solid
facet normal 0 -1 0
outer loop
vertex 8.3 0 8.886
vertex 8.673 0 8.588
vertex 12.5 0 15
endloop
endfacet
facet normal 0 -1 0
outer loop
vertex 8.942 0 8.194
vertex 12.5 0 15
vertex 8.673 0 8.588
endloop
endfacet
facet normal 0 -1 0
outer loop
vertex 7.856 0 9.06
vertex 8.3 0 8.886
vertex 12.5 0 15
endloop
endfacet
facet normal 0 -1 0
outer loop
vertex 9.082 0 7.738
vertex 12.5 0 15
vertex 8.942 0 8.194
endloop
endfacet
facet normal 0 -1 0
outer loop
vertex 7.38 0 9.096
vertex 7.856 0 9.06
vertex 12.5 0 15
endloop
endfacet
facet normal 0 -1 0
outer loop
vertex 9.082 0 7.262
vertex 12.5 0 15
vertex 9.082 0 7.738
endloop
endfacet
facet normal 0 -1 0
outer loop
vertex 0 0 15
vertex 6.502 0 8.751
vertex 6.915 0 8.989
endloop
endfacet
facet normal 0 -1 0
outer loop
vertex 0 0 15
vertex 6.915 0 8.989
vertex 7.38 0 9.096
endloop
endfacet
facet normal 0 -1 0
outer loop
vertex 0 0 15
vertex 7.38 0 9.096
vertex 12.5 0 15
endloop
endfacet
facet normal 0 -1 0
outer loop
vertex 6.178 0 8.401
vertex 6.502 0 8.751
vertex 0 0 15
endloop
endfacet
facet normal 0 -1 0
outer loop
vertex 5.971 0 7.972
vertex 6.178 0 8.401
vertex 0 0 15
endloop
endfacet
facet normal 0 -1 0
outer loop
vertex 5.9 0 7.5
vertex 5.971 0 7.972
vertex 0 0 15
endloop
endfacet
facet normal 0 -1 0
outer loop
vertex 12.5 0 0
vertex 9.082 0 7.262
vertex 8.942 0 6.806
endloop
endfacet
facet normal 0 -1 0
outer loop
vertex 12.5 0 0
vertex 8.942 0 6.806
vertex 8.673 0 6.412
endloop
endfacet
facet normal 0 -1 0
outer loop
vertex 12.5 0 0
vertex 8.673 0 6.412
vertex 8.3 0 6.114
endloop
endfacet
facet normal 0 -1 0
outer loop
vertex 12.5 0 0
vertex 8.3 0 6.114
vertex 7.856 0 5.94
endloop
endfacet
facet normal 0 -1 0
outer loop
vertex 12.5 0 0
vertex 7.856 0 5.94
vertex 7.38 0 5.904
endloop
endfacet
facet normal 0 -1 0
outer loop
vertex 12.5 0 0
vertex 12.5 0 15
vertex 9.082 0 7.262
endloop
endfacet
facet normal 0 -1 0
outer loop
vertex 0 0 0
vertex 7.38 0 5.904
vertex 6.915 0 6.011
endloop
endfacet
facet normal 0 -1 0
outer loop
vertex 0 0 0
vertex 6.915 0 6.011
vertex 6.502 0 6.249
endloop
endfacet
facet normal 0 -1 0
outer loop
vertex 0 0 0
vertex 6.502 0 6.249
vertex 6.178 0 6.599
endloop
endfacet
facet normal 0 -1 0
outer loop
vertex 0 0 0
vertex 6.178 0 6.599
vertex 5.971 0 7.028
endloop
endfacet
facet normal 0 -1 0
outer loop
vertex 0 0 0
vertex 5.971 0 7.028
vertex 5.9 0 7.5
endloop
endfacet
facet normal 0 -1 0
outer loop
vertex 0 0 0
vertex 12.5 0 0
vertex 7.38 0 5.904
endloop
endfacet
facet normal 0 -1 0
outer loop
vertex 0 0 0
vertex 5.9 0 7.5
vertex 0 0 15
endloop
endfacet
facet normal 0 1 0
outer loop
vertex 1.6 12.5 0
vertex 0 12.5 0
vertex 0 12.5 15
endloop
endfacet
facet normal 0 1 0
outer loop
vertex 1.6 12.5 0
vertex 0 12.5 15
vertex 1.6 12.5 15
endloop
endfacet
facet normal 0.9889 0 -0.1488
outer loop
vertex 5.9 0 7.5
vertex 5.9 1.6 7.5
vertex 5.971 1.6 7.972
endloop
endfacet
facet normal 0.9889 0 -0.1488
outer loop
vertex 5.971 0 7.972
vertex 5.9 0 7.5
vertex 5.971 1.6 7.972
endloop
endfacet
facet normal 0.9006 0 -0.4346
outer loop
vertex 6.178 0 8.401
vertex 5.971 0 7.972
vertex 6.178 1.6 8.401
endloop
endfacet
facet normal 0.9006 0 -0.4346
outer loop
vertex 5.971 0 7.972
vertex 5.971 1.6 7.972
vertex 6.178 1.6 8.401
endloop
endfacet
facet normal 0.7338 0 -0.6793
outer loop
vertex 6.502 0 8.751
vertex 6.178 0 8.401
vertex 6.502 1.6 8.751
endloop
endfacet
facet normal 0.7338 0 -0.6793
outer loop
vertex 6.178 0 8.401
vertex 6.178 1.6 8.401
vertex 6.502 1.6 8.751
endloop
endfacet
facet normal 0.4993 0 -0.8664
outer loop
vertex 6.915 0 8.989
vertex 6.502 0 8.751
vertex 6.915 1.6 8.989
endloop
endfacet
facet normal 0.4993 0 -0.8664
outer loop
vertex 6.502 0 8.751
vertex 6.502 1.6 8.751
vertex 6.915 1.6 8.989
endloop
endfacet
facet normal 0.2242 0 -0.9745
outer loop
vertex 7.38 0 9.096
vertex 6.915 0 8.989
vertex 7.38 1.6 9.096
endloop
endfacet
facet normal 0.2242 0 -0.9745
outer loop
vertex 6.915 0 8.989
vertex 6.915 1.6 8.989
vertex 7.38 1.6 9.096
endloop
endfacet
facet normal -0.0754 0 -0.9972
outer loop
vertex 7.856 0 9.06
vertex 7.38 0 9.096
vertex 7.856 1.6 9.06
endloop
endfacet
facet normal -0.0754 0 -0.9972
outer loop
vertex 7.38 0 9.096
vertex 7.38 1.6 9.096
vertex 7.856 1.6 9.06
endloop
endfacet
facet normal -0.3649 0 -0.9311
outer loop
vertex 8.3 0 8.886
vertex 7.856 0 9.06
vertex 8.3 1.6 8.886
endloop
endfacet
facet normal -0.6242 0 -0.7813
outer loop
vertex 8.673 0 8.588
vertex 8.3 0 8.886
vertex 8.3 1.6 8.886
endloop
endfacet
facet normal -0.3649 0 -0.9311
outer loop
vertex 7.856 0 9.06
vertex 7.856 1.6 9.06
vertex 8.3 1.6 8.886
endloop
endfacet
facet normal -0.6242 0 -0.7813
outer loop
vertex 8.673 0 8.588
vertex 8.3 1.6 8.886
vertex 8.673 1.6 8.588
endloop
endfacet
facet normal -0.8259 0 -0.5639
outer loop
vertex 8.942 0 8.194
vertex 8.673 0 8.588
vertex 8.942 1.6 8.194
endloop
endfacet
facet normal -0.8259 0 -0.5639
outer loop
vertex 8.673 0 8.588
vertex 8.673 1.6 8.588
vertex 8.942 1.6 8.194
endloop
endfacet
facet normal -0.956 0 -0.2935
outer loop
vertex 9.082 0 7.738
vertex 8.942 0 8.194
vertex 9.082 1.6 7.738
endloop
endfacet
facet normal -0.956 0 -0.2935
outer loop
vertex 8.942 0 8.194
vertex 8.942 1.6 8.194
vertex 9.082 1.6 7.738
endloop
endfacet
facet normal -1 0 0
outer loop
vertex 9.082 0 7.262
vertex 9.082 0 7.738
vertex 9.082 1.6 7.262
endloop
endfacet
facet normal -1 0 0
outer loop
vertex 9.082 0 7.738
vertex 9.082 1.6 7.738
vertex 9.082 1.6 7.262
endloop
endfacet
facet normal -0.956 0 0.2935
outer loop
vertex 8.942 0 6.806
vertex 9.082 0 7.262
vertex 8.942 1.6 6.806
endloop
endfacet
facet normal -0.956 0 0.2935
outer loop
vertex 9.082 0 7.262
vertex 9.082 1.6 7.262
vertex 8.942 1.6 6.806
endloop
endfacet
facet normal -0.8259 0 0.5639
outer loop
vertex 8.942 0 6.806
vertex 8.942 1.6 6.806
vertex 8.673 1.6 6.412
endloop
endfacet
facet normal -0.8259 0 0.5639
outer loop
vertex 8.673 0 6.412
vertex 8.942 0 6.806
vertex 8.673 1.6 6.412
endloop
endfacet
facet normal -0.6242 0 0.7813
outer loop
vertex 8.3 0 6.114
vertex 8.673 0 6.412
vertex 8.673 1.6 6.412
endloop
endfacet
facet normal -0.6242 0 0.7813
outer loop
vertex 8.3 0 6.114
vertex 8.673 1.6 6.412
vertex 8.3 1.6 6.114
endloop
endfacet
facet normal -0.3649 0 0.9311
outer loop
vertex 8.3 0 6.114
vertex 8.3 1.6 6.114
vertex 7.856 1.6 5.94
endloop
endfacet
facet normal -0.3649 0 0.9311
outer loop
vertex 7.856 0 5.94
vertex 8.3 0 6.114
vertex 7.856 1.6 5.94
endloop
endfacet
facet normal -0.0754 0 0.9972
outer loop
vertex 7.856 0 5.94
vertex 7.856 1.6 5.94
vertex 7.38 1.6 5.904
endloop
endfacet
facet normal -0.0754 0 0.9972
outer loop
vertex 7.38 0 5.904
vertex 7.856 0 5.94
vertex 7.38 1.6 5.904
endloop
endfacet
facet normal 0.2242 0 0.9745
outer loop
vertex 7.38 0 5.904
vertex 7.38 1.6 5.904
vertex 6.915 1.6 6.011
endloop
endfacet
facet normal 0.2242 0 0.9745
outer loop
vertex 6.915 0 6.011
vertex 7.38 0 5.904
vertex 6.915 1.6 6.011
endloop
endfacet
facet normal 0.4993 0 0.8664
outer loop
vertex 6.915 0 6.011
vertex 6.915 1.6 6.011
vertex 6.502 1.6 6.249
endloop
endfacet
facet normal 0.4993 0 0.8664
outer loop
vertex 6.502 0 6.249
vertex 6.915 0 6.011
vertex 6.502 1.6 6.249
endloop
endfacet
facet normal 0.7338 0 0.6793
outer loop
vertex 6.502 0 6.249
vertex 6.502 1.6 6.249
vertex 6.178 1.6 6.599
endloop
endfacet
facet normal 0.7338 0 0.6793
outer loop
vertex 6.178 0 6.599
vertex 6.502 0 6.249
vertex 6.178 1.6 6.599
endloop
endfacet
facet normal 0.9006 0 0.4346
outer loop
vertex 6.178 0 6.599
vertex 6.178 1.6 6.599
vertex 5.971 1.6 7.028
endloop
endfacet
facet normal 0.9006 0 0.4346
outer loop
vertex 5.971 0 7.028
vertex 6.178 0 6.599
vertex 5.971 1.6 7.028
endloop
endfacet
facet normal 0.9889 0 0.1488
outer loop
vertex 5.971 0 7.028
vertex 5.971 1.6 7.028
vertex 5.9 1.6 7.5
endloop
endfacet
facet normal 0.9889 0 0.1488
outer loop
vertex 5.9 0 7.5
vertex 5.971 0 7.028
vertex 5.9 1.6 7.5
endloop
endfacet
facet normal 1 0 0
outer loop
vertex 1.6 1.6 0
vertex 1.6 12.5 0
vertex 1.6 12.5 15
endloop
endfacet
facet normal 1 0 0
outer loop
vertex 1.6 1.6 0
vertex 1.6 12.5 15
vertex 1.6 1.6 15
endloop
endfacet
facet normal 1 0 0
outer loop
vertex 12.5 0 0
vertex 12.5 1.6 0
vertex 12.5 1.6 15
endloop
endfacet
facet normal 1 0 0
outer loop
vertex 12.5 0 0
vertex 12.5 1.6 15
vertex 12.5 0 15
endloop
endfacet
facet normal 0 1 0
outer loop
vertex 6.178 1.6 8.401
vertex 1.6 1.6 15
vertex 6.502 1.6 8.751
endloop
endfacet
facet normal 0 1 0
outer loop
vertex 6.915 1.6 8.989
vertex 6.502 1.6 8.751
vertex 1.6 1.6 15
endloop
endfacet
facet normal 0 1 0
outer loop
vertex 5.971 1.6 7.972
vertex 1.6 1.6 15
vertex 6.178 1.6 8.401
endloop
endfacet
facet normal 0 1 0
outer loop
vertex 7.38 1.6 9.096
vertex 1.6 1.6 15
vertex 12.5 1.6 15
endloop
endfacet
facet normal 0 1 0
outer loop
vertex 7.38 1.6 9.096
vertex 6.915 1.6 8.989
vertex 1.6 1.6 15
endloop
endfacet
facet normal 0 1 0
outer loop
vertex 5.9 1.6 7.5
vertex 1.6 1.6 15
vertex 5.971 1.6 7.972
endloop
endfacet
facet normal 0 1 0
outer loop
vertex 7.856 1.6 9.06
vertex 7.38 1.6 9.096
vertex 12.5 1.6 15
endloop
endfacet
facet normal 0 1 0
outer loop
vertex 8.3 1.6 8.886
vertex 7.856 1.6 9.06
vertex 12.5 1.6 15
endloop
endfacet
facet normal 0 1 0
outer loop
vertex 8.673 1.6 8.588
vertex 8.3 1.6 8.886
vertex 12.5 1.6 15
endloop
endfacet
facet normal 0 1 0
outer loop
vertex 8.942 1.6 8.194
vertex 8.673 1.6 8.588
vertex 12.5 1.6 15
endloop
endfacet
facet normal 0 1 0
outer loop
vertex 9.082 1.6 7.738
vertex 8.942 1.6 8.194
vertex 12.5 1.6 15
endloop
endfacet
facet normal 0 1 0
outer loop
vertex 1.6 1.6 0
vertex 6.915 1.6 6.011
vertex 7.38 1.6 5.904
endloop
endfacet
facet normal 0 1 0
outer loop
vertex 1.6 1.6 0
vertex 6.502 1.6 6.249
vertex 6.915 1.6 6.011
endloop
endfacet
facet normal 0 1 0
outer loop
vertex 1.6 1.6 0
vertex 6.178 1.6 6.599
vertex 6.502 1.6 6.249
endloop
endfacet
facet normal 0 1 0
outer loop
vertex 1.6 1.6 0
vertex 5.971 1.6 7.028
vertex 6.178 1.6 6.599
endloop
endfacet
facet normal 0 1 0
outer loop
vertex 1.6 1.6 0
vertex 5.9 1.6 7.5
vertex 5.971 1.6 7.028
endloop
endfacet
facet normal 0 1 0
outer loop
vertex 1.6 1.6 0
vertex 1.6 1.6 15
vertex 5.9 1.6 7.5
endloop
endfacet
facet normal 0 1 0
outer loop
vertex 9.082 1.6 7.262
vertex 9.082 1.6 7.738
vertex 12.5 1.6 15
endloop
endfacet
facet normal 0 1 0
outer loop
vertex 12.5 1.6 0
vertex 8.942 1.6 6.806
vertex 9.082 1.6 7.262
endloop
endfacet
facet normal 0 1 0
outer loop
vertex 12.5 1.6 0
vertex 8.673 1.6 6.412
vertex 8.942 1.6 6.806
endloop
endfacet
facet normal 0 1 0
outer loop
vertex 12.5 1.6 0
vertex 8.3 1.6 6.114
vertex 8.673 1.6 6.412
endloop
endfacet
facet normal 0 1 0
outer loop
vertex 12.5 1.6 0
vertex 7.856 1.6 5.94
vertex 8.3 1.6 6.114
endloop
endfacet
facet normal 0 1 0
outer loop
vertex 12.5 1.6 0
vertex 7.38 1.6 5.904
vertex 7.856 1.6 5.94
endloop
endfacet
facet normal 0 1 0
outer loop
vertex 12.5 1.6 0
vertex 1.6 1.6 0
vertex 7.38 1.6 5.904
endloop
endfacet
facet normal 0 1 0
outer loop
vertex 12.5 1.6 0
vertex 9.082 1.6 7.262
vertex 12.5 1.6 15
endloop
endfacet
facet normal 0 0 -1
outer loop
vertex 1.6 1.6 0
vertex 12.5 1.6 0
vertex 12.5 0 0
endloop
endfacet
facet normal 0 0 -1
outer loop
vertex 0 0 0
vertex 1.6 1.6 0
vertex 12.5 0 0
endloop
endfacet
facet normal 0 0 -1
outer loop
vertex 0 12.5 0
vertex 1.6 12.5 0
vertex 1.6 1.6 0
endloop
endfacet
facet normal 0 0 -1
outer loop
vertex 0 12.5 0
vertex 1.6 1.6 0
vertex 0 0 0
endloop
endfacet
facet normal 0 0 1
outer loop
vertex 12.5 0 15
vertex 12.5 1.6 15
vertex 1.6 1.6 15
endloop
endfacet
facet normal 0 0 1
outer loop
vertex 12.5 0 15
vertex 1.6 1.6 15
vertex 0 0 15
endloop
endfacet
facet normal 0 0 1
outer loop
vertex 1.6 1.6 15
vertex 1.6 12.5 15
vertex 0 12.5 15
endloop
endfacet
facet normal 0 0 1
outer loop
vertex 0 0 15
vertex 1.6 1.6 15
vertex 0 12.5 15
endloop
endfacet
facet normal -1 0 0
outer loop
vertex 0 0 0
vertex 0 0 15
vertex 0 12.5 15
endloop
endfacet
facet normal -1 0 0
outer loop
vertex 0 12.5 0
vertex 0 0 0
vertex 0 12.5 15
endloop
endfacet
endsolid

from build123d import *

# Parameters (mm, degrees)
BOSS_EXTRUDE1_DEPTH = 15
SKETCH2_R           = 1.6
CUT_EXTRUDE1_DEPTH  = 23.362021376


with BuildPart() as part:
    # Sketch1 → Boss-Extrude1 (new body)
    with BuildSketch(Plane.XY):
        Polygon((0, 0), (0, 12.5), (1.6, 12.5), (1.6, 1.6), (12.5, 1.6), (12.5, 0), align=None)
    extrude(amount=BOSS_EXTRUDE1_DEPTH)

    # Sketch2 → Cut-Extrude1 (cut, through all)
    with BuildSketch(Plane(origin=(0, 1.6, 0), x_dir=(1, 0, 0), z_dir=(0, 1, 0))):
        with Locations(Location((7.5, -7.5, 0), (0, 0, 180))):
            Circle(SKETCH2_R)
    extrude(amount=-CUT_EXTRUDE1_DEPTH, mode=Mode.SUBTRACT)


solid = part.part
